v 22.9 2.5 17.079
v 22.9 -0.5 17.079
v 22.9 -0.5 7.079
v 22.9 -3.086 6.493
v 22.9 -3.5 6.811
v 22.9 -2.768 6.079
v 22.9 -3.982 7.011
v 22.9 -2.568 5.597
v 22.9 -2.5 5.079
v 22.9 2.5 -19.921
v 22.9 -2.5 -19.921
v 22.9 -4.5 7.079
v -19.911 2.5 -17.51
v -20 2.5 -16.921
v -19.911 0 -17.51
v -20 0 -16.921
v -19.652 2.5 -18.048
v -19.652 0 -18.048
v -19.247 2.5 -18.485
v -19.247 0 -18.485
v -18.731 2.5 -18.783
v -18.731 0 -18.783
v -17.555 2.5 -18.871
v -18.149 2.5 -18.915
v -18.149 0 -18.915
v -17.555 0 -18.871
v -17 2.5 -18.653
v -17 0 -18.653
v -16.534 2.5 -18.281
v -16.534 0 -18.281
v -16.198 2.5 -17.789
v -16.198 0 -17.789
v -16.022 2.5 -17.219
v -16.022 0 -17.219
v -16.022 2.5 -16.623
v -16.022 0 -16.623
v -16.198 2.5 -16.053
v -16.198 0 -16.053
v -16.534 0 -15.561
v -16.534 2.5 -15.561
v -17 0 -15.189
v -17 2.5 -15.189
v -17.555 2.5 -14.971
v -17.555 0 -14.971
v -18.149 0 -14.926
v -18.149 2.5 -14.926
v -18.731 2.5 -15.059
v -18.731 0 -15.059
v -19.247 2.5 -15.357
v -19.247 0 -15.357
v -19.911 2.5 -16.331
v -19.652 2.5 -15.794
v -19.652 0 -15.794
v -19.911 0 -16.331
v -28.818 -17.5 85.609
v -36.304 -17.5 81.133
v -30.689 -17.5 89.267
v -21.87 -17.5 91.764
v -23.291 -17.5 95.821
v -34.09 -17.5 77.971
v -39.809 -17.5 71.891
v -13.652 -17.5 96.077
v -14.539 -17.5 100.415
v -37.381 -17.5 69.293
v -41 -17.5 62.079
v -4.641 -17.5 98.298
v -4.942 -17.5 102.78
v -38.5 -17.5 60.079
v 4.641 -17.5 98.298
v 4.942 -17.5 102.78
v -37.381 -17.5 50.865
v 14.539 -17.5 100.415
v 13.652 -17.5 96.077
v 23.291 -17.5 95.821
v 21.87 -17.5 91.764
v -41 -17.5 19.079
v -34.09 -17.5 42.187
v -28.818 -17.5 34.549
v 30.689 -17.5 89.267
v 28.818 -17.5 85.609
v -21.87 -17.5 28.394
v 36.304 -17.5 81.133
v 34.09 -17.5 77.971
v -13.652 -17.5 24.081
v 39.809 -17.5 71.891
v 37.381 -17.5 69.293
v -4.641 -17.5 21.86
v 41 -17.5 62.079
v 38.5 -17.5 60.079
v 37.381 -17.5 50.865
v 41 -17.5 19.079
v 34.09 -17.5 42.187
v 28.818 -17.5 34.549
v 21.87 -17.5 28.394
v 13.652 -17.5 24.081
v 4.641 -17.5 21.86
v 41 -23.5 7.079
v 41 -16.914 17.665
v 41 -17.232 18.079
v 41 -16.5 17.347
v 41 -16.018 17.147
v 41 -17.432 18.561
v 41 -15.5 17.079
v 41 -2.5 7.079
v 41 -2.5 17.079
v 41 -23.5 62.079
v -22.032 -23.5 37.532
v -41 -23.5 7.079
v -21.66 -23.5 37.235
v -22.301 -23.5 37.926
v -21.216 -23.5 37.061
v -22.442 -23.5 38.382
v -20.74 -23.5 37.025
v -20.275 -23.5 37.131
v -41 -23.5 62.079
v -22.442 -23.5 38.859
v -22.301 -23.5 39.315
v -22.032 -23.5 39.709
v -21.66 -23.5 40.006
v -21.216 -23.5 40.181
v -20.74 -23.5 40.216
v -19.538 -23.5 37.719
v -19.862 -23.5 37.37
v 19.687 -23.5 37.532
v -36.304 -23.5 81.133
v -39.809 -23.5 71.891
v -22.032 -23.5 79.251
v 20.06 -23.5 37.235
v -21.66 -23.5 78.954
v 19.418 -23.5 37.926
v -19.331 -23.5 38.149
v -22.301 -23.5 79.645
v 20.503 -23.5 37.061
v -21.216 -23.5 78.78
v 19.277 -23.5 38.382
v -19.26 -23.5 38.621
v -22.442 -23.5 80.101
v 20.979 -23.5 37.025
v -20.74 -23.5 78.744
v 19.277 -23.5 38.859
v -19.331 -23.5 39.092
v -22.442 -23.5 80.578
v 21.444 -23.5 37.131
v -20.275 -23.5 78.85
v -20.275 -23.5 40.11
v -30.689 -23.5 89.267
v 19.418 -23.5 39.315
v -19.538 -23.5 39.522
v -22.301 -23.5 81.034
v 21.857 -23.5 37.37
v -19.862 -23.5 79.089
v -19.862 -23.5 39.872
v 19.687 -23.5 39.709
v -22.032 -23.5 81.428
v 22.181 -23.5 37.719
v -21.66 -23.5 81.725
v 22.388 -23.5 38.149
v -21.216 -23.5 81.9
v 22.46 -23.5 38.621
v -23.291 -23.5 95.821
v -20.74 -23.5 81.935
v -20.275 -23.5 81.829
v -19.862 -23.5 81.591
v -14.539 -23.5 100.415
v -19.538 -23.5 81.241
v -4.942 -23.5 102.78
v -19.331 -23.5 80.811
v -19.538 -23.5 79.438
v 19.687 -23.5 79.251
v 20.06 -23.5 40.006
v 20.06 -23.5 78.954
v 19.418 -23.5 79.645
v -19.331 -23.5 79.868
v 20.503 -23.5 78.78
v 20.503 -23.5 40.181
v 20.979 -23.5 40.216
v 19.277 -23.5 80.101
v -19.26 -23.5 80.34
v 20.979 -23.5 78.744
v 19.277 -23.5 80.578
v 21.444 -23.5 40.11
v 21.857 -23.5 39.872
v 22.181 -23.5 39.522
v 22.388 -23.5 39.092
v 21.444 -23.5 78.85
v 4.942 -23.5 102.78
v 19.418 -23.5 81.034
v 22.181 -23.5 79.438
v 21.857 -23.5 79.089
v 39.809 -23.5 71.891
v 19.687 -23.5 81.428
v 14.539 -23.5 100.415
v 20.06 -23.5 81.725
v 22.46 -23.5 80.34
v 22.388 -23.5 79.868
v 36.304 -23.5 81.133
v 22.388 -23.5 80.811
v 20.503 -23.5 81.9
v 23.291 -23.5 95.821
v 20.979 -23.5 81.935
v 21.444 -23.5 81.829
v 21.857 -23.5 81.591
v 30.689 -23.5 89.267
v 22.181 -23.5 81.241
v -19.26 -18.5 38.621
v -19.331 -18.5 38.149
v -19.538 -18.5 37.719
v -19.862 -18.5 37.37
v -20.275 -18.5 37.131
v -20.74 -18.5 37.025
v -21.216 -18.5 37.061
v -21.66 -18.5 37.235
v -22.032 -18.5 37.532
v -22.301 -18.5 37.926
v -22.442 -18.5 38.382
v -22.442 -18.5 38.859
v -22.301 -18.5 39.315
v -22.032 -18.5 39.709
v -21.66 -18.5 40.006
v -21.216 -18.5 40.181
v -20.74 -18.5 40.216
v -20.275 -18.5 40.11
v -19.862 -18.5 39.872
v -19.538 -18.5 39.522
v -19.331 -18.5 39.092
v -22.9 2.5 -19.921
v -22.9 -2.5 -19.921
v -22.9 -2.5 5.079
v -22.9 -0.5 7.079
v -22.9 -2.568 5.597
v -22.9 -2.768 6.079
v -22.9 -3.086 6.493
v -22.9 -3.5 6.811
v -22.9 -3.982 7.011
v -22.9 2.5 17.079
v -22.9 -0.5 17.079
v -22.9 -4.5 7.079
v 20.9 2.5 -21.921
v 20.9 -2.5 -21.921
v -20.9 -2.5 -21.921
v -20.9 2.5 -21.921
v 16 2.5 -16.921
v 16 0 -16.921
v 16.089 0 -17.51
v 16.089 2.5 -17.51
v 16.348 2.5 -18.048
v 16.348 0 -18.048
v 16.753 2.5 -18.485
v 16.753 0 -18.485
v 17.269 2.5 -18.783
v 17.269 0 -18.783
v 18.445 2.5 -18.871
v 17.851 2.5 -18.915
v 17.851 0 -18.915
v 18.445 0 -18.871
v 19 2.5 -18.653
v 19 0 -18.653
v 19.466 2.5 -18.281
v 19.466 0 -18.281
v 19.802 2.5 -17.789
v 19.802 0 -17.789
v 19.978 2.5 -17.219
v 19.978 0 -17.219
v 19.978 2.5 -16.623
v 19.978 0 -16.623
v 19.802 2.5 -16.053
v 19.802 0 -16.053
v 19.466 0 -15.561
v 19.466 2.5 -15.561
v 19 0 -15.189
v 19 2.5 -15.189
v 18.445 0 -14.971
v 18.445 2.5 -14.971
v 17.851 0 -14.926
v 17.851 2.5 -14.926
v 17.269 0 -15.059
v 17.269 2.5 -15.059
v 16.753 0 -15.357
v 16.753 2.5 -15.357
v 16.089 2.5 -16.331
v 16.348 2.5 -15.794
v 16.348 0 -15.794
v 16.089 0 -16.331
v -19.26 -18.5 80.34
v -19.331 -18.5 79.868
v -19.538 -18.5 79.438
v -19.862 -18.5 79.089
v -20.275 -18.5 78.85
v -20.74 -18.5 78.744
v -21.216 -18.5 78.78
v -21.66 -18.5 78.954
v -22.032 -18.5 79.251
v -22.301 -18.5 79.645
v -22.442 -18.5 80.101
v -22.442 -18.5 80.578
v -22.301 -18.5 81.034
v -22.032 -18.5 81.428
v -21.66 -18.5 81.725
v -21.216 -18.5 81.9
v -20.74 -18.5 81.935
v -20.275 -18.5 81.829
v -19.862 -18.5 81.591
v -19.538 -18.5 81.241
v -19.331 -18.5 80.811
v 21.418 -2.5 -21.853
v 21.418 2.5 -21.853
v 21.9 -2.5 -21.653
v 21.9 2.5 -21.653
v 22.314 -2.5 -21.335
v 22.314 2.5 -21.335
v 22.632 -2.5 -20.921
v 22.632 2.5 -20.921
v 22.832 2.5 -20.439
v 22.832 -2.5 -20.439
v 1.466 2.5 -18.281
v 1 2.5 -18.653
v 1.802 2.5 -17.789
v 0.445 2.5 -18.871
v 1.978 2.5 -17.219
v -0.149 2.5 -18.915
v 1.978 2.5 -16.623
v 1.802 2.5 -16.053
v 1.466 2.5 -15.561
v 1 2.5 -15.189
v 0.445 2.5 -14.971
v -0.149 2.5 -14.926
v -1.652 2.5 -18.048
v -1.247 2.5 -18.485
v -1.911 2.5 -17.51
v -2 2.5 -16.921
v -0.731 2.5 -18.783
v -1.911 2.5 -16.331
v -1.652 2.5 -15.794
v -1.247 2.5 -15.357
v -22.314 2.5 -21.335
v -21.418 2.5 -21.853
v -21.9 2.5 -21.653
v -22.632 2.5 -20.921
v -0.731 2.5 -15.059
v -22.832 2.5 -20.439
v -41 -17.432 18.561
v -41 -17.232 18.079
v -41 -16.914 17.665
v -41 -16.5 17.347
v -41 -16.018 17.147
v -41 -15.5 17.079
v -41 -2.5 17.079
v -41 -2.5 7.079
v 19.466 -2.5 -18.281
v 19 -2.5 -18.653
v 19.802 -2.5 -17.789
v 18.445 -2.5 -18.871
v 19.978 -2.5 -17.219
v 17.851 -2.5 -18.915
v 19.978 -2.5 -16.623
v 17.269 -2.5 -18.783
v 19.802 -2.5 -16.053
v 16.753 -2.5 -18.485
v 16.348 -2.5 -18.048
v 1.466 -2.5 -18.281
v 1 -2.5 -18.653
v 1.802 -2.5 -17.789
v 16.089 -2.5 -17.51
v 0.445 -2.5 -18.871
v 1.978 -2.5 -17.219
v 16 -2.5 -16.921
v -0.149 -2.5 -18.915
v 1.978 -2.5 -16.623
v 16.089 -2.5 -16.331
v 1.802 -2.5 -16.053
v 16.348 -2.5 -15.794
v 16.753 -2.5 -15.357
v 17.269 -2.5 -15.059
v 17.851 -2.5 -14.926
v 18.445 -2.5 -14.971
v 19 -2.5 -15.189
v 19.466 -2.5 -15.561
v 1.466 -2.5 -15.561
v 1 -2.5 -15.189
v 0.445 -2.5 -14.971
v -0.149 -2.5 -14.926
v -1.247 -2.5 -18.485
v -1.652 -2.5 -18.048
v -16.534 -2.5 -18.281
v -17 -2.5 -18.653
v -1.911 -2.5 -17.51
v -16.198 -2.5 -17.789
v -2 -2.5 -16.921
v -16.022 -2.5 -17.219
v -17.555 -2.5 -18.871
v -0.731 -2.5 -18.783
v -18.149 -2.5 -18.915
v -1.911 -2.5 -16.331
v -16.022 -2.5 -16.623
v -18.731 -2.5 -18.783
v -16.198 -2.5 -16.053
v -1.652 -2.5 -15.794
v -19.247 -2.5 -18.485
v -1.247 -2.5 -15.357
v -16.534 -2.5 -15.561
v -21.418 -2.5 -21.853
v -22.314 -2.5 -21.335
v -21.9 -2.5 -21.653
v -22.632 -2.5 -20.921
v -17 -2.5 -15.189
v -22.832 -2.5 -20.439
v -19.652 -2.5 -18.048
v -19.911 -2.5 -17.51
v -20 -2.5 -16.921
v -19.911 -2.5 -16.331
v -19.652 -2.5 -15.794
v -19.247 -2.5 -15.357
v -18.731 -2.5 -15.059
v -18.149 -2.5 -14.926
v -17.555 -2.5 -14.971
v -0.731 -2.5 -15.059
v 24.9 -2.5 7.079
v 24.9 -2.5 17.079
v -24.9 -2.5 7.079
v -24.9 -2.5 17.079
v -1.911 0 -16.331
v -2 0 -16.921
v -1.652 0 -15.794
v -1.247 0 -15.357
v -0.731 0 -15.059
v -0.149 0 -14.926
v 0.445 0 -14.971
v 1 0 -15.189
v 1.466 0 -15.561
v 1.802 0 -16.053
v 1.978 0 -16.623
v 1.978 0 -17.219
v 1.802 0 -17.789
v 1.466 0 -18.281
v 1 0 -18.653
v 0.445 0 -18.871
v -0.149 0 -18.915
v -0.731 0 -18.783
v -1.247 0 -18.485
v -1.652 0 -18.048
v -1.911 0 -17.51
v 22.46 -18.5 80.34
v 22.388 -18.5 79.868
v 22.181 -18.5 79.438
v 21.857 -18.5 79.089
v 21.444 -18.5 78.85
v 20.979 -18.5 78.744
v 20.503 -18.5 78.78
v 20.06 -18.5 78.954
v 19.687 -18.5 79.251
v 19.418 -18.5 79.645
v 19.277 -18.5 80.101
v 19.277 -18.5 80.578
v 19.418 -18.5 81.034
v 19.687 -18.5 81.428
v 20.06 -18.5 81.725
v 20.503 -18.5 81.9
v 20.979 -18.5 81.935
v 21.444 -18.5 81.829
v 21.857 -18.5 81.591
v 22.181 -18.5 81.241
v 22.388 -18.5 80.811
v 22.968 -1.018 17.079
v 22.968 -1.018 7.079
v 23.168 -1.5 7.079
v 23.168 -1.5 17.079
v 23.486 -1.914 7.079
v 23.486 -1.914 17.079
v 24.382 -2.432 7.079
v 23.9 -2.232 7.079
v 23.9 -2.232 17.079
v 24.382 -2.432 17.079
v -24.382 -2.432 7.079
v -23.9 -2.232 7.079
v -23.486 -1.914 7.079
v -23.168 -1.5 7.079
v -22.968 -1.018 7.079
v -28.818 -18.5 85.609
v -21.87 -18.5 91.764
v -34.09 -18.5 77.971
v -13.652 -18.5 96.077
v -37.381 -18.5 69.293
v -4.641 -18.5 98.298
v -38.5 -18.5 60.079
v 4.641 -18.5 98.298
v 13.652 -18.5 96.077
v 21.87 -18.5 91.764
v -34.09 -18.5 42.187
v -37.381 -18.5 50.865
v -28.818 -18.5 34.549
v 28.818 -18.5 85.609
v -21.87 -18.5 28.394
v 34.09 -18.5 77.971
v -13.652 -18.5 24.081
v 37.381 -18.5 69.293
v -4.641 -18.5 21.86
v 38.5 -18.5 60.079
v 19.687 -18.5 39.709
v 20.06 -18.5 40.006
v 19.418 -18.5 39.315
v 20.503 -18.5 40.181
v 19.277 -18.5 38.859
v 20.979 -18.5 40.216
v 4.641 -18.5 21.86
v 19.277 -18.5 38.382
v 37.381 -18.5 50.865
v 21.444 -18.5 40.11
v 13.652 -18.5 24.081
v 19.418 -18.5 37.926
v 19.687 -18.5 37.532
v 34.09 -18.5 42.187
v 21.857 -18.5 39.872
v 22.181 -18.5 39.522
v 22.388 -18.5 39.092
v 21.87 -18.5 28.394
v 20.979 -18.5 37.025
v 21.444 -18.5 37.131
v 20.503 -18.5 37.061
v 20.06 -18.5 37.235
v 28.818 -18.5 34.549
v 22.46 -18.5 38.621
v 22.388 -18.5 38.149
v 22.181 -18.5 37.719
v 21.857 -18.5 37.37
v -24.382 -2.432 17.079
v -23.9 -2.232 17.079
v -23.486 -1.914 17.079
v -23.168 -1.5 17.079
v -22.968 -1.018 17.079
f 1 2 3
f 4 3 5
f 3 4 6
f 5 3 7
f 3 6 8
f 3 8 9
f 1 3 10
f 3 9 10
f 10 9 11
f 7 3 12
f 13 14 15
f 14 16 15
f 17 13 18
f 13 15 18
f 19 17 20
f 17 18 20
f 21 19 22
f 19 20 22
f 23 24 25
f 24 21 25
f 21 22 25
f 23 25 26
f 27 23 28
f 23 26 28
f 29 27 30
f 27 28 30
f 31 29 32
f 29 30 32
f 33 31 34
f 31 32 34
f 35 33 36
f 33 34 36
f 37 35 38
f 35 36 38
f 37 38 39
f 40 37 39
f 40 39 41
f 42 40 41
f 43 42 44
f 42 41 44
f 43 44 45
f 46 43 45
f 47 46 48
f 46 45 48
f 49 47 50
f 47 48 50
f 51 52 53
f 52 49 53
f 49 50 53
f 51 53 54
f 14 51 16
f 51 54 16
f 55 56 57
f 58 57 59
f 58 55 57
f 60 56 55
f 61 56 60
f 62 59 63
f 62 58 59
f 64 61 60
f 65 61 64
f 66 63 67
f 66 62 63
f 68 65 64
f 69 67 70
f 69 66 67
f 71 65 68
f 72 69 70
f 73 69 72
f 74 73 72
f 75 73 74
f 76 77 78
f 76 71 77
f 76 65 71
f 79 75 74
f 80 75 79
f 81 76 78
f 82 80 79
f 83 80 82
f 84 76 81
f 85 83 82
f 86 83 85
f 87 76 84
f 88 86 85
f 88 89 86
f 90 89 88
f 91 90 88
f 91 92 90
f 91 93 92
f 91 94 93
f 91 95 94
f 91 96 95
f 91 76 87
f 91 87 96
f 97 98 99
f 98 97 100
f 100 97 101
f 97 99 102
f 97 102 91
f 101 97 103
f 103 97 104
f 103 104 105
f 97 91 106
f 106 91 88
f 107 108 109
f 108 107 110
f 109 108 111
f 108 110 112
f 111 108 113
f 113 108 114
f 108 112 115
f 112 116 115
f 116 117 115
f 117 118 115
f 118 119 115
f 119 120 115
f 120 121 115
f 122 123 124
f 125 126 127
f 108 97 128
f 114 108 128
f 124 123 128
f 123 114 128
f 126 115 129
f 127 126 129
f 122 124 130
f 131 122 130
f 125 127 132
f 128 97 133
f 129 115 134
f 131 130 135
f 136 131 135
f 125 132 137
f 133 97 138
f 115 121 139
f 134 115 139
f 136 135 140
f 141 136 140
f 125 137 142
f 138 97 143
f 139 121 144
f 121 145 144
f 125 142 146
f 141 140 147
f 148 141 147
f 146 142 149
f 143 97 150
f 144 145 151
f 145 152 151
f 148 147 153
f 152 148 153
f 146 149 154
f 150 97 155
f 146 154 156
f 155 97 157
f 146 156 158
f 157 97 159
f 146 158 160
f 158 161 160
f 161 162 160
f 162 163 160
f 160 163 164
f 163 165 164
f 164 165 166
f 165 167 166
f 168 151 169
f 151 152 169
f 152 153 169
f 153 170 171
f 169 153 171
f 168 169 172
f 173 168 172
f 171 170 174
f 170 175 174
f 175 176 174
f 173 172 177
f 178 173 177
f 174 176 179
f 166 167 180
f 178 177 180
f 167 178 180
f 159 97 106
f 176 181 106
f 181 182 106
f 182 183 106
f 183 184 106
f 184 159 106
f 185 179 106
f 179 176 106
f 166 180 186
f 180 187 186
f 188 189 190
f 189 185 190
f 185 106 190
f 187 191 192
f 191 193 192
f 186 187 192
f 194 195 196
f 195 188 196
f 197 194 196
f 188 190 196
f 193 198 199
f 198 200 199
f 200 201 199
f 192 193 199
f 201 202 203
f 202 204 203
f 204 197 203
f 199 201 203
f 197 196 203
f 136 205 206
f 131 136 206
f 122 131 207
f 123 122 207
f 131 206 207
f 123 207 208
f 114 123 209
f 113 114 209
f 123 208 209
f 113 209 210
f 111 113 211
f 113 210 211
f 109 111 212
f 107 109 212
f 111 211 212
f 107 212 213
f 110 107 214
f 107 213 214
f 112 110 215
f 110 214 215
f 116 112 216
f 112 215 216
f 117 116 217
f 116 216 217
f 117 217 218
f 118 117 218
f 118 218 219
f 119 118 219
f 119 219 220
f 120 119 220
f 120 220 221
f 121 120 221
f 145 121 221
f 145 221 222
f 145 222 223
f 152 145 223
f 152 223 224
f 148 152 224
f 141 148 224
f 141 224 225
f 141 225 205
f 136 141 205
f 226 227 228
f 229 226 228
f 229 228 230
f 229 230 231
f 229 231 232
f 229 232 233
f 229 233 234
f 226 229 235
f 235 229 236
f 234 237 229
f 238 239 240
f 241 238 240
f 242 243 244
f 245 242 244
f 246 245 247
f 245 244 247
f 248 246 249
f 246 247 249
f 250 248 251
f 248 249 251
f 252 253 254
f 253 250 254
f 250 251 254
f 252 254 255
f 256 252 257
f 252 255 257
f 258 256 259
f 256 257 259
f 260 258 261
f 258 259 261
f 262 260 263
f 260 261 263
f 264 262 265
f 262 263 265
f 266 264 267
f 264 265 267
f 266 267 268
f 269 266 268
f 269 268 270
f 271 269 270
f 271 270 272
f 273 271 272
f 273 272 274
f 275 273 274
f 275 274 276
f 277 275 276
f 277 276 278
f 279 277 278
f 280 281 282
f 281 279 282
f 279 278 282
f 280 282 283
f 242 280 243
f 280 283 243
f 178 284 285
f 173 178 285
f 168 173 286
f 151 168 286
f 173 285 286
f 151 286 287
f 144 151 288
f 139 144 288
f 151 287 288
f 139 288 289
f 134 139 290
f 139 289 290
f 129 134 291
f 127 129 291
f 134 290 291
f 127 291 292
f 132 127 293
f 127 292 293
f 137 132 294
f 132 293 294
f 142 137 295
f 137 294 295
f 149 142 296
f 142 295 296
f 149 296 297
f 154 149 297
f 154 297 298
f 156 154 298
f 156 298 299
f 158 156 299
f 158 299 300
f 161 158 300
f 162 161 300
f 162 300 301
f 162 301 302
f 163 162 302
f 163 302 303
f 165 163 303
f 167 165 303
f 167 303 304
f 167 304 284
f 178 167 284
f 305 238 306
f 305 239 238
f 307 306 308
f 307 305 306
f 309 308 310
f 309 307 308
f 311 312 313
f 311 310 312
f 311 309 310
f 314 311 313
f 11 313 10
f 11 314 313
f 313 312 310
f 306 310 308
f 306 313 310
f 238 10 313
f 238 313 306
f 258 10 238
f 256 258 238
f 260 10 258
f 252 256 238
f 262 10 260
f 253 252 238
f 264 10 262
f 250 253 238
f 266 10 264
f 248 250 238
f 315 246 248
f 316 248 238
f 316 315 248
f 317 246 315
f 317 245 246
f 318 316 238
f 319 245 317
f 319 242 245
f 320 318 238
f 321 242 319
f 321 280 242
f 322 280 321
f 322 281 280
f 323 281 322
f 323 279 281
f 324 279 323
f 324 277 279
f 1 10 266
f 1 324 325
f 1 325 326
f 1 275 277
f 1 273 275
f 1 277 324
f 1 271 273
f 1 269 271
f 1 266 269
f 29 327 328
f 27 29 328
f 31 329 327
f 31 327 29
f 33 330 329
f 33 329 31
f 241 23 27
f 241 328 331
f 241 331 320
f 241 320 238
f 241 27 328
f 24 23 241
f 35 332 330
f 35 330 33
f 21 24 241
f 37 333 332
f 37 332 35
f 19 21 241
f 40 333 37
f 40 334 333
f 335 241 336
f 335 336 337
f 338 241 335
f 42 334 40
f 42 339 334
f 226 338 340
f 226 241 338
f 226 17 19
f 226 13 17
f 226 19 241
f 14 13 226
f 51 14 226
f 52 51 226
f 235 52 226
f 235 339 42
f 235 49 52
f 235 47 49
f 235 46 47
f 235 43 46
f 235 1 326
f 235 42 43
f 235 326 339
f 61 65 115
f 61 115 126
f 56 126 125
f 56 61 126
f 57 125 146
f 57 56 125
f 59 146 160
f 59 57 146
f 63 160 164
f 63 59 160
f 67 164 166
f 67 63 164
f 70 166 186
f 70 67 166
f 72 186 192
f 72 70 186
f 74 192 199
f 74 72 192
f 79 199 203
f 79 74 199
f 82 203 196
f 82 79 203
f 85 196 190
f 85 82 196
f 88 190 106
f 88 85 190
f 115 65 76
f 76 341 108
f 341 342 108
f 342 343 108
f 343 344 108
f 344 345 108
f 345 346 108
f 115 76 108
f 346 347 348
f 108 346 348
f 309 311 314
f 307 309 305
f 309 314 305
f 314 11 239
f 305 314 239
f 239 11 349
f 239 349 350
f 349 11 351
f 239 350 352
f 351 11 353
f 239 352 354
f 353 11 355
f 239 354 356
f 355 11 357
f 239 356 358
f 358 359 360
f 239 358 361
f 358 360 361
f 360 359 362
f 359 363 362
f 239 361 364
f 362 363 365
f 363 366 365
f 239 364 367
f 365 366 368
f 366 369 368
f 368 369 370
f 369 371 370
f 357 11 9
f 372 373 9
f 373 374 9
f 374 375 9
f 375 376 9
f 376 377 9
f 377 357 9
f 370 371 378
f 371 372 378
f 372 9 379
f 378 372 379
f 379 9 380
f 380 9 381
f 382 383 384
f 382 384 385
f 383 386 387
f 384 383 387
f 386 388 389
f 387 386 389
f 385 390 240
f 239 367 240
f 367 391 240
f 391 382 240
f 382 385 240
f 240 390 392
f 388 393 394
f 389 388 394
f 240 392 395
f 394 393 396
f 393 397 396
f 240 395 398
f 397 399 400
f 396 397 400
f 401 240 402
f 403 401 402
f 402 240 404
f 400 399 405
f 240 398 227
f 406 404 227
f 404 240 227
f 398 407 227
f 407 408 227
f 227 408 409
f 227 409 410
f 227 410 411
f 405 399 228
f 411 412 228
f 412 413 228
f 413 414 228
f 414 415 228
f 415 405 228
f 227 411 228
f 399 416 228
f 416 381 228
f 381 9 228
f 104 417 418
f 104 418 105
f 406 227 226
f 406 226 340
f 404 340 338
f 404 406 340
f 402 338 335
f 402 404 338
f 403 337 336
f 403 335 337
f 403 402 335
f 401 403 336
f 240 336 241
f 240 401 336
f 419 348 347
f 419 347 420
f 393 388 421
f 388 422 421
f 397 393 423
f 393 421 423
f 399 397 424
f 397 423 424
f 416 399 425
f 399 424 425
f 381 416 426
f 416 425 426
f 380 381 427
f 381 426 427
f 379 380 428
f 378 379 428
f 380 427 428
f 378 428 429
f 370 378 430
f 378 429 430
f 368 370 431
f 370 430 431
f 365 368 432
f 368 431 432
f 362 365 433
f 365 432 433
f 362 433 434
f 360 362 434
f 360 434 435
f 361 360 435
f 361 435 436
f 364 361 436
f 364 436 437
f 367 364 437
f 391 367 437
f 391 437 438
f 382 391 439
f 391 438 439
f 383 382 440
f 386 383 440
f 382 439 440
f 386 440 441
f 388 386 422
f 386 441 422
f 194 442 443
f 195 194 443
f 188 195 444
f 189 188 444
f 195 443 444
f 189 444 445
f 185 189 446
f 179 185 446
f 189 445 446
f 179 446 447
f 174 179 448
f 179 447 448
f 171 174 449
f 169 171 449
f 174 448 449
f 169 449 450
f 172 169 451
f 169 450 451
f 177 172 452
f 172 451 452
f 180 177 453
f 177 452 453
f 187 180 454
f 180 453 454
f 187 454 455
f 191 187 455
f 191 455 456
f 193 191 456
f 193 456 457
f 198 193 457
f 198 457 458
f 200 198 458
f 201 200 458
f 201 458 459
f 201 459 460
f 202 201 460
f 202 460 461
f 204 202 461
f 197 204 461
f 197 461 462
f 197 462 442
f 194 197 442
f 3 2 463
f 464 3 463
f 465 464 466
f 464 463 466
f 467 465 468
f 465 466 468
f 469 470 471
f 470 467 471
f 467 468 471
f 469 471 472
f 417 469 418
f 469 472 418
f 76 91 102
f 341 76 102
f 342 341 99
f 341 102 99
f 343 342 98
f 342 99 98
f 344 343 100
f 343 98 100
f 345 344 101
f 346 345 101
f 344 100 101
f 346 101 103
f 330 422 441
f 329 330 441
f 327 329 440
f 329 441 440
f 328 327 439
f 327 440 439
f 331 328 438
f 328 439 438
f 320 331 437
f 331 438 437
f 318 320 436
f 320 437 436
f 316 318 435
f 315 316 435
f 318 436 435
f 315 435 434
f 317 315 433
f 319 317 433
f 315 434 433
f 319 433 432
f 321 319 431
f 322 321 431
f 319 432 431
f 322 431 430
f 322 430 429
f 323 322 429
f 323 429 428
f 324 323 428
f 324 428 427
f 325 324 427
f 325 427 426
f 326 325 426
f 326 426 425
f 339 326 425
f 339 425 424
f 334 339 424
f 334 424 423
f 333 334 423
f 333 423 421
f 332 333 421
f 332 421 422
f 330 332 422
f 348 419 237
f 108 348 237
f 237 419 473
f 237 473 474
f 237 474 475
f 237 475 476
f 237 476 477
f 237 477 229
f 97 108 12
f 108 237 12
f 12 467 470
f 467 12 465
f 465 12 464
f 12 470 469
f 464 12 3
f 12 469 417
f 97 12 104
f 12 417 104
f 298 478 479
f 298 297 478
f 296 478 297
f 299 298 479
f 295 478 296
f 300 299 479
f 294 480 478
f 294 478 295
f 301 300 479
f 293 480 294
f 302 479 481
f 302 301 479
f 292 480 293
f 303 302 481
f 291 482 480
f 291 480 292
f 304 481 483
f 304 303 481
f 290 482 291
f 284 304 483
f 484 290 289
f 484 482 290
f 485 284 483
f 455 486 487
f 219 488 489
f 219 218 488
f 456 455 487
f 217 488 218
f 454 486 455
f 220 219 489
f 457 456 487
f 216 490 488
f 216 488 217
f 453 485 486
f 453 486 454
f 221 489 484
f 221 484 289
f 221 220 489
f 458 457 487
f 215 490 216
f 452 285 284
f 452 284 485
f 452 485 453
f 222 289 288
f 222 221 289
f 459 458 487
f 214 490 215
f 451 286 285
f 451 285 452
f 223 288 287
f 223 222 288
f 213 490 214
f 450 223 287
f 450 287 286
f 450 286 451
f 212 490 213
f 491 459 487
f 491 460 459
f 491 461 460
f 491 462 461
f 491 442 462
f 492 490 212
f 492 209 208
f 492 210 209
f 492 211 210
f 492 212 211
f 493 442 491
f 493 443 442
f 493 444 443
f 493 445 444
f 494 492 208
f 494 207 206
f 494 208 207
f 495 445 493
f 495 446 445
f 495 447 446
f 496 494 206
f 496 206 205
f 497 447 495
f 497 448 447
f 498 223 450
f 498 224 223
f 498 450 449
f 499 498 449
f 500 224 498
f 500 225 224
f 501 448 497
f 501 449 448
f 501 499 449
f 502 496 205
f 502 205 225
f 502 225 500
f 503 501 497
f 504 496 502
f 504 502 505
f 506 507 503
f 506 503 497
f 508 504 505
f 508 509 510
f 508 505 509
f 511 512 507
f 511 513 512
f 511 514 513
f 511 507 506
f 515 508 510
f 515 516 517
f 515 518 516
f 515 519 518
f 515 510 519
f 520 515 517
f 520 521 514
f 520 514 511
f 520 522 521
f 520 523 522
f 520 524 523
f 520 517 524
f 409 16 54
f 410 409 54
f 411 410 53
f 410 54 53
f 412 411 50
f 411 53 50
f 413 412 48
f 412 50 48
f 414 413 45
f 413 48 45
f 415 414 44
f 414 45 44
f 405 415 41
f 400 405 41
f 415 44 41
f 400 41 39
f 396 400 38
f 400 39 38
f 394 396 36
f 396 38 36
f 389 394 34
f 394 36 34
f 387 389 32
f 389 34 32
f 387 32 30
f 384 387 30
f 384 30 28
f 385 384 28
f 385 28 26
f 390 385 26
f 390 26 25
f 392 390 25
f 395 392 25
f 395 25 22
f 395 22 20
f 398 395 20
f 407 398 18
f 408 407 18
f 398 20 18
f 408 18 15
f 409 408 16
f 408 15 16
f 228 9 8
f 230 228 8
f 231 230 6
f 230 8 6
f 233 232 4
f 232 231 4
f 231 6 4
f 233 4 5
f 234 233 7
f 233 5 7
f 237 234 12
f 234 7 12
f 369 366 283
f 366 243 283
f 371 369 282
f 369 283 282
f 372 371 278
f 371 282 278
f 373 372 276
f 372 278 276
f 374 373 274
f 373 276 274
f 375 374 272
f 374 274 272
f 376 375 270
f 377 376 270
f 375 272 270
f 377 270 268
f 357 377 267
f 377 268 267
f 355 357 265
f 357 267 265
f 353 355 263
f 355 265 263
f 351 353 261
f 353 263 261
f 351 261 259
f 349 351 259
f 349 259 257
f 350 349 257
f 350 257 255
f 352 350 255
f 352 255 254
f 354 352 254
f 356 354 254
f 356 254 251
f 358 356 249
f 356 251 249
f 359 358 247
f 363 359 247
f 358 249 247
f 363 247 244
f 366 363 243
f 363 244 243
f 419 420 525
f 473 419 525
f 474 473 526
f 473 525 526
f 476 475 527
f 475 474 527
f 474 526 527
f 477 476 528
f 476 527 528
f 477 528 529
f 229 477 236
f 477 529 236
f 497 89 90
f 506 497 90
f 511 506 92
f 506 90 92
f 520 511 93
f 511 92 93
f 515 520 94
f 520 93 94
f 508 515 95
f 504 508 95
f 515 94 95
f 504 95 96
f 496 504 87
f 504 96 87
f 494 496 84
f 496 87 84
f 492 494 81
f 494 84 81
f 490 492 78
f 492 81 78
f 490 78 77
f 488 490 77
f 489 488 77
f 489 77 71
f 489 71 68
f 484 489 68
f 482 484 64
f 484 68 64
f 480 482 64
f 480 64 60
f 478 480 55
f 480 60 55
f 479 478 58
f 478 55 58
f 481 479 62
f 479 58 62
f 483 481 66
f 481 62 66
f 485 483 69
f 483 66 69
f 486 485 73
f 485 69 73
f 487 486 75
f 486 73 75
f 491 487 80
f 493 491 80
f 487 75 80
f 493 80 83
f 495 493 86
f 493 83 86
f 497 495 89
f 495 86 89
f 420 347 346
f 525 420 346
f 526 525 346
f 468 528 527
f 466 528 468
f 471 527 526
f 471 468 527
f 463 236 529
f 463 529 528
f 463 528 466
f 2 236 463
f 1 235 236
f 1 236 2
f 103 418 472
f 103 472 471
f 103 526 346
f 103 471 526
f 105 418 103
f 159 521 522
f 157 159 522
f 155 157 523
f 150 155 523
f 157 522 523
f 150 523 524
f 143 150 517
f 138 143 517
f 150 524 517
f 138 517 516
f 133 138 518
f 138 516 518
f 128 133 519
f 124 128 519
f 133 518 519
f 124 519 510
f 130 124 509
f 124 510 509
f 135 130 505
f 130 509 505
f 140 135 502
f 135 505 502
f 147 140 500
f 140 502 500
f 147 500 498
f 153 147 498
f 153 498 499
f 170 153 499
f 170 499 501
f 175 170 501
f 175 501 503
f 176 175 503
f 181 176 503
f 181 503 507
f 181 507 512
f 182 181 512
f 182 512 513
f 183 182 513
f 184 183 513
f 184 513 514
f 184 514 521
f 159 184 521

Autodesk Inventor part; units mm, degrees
ref_plane "YZ Plane" through (0, 0, 0) normal (1, 0, 0) x (0, 1, 0)
ref_plane "XZ Plane" through (0, 0, 0) normal (0, 1, 0) x (-1, 0, 0)
sketch "草圖1" plane through (0, 0, 0) normal (0, 1, 0) x (-1, 0, 0)
  line L0 (22.9, 7.0791) -> (-22.9, 7.0791)
  line L1 (-22.9, 7.0791) -> (-22.9, -19.9209)
  line L2 (-20.9, -21.9209) -> (20.9, -21.9209)
  line L3 (22.9, -19.9209) -> (22.9, 7.0791)
  arc A0 (20.9, -21.9209) -> (22.9, -19.9209) centre (20.9, -19.9209) ccw
  arc A1 (-22.9, -19.9209) -> (-20.9, -21.9209) centre (-20.9, -19.9209) ccw
  line L4 (0, -28.2179) -> (0, 12.962) projected
  circle A2 centre (0, -16.9209) radius 2
  circle A3 centre (-18, -16.9209) radius 2
  circle A4 centre (18, -16.9209) radius 2
  point P0 (0, 0)
  dimension "d2" = 2
  dimension "d3" = 4
  dimension "d4" = 18
  dimension "d5" = 4
  dimension "d6" = 24
  dimension "d9" = 5
extrude "擠出1" add sketch "草圖1" along normal mid plane 5 contours L3 A0 L2 L4 A2 L0 | L4 A2 L2 A1 L1 L0
sketch "草圖3" plane through (-22.9, 2.5, 7.0791) normal (0, 0, 1) x (1, 0, 0)
  line L0 (0, -5) -> (0, 0) projected
  line L1 (0, 0) -> (45.8, 0) projected
  line L2 (45.8, -5) -> (45.8, 0) projected
  line L3 (0, 0) -> (45.8, 0)
  line L4 (45.8, 0) -> (45.8, -5)
  line L5 (0, -5) -> (0, 0)
  line L6 (0, 0) -> (45.8, -5) construction
  line L7 (45.8, 0) -> (0, -5) construction
  line L8 (24.9, -5) -> (20.9, -5) projected
  line L9 (-18.1, -5) -> (63.9, -5)
  line L10 (-18.1, -5) -> (-18.1, -28)
  line L11 (-18.1, -28) -> (63.9, -28)
  line L12 (63.9, -28) -> (63.9, -5)
  point P0 (22.9, -2.5)
  point P1 (22.9, -5)
  dimension "d12" = 82
  dimension "d13" = 23
extrude "擠出2" add sketch "草圖3" along normal blind 10
ref_plane "工作平面1" through (0, -17.5, 0) normal (0, 1, 0) x (1, 0, 0)
sketch "草圖5" plane through (0, -17.5, 0) normal (0, 1, 0) x (1, 0, 0)
  line L0 (-41, -17.0791) -> (41, -17.0791) projected
  line L1 (-41, -17.0791) -> (41, -17.0791)
  line L2 (41, -17.0791) -> (41, -62.0791)
  line L3 (0, -103.0791) -> (0, -103.0791)
  line L4 (-41, -62.0791) -> (-41, -17.0791)
  arc A0 (0, -103.0791) -> (41, -62.0791) centre (0, -62.0791) ccw
  arc A1 (-41, -62.0791) -> (0, -103.0791) centre (0, -62.0791) ccw
  point P0 (0, 0)
  point P1 (41, -103.0791)
  point P2 (-41, -103.0791)
  point P3 (41, -17.0791)
  point P4 (0, -103.0791)
  dimension "d19" = 86
  dimension "d22" = 41
  dimension "d23" = 41
  dimension "d37" = 82
extrude "擠出3" add sketch "草圖5" against normal up to surface (8 mm away)
sketch "草圖6" plane through (0, -17.5, 0) normal (0, 1, 0) x (1, 0, 0)
  arc A0 (-41, -62.0791) -> (41, -62.0791) centre (0, -62.0791) ccw projected
  circle A1 centre (0, -60.0791) radius 38.5
  line L0 (-41, -17.0791) -> (41, -17.0791) projected
  point P0 (0, 0)
  dimension "d24" = 77
  dimension "d28" = 43
fillet "圓角2" radius 2 1 edges at (0, -17.5, 17.0791)
extrude "擠出5" cut sketch "草圖6" against normal blind 1
sketch "草圖8" plane through (0, -18.5, 60.0791) normal (0, 1, 0) x (1, 0, 0)
  circle A0 centre (-20.8595, 21.4584) radius 1.6
  circle A1 centre (0, 0) radius 38.5 projected
  line L0 (0, 107) -> (0, -68) projected
  circle A2 centre (20.8595, 21.4584) radius 1.6
  circle A3 centre (20.8595, -20.2606) radius 1.6
  circle A4 centre (-20.8595, -20.2606) radius 1.6
  point P0 (0, 60.0791)
  dimension "d32" = 3.2
  dimension "d33" = 41.719
  dimension "d38" = 41.719
extrude "擠出6" cut sketch "草圖8" against normal through all contours A0 | A2 | A3 | A4
fillet "圓角3" radius 2 3 edges at (22.9, -2.5, 12.0791) (-22.9, -2.5, 12.0791) (0, -2.5, 7.0791)
sketch "草圖9" plane through (41, -25.5, 7.0791) normal (1, 0, 0) x (0, 0, -1)
  line L0 (-55, 0) -> (-96, 0) projected
  line L1 (0, 23) -> (0, 0) projected
  line L2 (-96, 0) -> (0, 0)
  line L3 (0, 0) -> (0, 2)
  line L4 (0, 2) -> (-96, 2)
  line L5 (-96, 2) -> (-96, 0)
  point P0 (7.0791, 25.5)
  dimension "d39" = 2
extrude "擠出7" cut sketch "草圖9" against normal through all
properties part number "lidar base"
